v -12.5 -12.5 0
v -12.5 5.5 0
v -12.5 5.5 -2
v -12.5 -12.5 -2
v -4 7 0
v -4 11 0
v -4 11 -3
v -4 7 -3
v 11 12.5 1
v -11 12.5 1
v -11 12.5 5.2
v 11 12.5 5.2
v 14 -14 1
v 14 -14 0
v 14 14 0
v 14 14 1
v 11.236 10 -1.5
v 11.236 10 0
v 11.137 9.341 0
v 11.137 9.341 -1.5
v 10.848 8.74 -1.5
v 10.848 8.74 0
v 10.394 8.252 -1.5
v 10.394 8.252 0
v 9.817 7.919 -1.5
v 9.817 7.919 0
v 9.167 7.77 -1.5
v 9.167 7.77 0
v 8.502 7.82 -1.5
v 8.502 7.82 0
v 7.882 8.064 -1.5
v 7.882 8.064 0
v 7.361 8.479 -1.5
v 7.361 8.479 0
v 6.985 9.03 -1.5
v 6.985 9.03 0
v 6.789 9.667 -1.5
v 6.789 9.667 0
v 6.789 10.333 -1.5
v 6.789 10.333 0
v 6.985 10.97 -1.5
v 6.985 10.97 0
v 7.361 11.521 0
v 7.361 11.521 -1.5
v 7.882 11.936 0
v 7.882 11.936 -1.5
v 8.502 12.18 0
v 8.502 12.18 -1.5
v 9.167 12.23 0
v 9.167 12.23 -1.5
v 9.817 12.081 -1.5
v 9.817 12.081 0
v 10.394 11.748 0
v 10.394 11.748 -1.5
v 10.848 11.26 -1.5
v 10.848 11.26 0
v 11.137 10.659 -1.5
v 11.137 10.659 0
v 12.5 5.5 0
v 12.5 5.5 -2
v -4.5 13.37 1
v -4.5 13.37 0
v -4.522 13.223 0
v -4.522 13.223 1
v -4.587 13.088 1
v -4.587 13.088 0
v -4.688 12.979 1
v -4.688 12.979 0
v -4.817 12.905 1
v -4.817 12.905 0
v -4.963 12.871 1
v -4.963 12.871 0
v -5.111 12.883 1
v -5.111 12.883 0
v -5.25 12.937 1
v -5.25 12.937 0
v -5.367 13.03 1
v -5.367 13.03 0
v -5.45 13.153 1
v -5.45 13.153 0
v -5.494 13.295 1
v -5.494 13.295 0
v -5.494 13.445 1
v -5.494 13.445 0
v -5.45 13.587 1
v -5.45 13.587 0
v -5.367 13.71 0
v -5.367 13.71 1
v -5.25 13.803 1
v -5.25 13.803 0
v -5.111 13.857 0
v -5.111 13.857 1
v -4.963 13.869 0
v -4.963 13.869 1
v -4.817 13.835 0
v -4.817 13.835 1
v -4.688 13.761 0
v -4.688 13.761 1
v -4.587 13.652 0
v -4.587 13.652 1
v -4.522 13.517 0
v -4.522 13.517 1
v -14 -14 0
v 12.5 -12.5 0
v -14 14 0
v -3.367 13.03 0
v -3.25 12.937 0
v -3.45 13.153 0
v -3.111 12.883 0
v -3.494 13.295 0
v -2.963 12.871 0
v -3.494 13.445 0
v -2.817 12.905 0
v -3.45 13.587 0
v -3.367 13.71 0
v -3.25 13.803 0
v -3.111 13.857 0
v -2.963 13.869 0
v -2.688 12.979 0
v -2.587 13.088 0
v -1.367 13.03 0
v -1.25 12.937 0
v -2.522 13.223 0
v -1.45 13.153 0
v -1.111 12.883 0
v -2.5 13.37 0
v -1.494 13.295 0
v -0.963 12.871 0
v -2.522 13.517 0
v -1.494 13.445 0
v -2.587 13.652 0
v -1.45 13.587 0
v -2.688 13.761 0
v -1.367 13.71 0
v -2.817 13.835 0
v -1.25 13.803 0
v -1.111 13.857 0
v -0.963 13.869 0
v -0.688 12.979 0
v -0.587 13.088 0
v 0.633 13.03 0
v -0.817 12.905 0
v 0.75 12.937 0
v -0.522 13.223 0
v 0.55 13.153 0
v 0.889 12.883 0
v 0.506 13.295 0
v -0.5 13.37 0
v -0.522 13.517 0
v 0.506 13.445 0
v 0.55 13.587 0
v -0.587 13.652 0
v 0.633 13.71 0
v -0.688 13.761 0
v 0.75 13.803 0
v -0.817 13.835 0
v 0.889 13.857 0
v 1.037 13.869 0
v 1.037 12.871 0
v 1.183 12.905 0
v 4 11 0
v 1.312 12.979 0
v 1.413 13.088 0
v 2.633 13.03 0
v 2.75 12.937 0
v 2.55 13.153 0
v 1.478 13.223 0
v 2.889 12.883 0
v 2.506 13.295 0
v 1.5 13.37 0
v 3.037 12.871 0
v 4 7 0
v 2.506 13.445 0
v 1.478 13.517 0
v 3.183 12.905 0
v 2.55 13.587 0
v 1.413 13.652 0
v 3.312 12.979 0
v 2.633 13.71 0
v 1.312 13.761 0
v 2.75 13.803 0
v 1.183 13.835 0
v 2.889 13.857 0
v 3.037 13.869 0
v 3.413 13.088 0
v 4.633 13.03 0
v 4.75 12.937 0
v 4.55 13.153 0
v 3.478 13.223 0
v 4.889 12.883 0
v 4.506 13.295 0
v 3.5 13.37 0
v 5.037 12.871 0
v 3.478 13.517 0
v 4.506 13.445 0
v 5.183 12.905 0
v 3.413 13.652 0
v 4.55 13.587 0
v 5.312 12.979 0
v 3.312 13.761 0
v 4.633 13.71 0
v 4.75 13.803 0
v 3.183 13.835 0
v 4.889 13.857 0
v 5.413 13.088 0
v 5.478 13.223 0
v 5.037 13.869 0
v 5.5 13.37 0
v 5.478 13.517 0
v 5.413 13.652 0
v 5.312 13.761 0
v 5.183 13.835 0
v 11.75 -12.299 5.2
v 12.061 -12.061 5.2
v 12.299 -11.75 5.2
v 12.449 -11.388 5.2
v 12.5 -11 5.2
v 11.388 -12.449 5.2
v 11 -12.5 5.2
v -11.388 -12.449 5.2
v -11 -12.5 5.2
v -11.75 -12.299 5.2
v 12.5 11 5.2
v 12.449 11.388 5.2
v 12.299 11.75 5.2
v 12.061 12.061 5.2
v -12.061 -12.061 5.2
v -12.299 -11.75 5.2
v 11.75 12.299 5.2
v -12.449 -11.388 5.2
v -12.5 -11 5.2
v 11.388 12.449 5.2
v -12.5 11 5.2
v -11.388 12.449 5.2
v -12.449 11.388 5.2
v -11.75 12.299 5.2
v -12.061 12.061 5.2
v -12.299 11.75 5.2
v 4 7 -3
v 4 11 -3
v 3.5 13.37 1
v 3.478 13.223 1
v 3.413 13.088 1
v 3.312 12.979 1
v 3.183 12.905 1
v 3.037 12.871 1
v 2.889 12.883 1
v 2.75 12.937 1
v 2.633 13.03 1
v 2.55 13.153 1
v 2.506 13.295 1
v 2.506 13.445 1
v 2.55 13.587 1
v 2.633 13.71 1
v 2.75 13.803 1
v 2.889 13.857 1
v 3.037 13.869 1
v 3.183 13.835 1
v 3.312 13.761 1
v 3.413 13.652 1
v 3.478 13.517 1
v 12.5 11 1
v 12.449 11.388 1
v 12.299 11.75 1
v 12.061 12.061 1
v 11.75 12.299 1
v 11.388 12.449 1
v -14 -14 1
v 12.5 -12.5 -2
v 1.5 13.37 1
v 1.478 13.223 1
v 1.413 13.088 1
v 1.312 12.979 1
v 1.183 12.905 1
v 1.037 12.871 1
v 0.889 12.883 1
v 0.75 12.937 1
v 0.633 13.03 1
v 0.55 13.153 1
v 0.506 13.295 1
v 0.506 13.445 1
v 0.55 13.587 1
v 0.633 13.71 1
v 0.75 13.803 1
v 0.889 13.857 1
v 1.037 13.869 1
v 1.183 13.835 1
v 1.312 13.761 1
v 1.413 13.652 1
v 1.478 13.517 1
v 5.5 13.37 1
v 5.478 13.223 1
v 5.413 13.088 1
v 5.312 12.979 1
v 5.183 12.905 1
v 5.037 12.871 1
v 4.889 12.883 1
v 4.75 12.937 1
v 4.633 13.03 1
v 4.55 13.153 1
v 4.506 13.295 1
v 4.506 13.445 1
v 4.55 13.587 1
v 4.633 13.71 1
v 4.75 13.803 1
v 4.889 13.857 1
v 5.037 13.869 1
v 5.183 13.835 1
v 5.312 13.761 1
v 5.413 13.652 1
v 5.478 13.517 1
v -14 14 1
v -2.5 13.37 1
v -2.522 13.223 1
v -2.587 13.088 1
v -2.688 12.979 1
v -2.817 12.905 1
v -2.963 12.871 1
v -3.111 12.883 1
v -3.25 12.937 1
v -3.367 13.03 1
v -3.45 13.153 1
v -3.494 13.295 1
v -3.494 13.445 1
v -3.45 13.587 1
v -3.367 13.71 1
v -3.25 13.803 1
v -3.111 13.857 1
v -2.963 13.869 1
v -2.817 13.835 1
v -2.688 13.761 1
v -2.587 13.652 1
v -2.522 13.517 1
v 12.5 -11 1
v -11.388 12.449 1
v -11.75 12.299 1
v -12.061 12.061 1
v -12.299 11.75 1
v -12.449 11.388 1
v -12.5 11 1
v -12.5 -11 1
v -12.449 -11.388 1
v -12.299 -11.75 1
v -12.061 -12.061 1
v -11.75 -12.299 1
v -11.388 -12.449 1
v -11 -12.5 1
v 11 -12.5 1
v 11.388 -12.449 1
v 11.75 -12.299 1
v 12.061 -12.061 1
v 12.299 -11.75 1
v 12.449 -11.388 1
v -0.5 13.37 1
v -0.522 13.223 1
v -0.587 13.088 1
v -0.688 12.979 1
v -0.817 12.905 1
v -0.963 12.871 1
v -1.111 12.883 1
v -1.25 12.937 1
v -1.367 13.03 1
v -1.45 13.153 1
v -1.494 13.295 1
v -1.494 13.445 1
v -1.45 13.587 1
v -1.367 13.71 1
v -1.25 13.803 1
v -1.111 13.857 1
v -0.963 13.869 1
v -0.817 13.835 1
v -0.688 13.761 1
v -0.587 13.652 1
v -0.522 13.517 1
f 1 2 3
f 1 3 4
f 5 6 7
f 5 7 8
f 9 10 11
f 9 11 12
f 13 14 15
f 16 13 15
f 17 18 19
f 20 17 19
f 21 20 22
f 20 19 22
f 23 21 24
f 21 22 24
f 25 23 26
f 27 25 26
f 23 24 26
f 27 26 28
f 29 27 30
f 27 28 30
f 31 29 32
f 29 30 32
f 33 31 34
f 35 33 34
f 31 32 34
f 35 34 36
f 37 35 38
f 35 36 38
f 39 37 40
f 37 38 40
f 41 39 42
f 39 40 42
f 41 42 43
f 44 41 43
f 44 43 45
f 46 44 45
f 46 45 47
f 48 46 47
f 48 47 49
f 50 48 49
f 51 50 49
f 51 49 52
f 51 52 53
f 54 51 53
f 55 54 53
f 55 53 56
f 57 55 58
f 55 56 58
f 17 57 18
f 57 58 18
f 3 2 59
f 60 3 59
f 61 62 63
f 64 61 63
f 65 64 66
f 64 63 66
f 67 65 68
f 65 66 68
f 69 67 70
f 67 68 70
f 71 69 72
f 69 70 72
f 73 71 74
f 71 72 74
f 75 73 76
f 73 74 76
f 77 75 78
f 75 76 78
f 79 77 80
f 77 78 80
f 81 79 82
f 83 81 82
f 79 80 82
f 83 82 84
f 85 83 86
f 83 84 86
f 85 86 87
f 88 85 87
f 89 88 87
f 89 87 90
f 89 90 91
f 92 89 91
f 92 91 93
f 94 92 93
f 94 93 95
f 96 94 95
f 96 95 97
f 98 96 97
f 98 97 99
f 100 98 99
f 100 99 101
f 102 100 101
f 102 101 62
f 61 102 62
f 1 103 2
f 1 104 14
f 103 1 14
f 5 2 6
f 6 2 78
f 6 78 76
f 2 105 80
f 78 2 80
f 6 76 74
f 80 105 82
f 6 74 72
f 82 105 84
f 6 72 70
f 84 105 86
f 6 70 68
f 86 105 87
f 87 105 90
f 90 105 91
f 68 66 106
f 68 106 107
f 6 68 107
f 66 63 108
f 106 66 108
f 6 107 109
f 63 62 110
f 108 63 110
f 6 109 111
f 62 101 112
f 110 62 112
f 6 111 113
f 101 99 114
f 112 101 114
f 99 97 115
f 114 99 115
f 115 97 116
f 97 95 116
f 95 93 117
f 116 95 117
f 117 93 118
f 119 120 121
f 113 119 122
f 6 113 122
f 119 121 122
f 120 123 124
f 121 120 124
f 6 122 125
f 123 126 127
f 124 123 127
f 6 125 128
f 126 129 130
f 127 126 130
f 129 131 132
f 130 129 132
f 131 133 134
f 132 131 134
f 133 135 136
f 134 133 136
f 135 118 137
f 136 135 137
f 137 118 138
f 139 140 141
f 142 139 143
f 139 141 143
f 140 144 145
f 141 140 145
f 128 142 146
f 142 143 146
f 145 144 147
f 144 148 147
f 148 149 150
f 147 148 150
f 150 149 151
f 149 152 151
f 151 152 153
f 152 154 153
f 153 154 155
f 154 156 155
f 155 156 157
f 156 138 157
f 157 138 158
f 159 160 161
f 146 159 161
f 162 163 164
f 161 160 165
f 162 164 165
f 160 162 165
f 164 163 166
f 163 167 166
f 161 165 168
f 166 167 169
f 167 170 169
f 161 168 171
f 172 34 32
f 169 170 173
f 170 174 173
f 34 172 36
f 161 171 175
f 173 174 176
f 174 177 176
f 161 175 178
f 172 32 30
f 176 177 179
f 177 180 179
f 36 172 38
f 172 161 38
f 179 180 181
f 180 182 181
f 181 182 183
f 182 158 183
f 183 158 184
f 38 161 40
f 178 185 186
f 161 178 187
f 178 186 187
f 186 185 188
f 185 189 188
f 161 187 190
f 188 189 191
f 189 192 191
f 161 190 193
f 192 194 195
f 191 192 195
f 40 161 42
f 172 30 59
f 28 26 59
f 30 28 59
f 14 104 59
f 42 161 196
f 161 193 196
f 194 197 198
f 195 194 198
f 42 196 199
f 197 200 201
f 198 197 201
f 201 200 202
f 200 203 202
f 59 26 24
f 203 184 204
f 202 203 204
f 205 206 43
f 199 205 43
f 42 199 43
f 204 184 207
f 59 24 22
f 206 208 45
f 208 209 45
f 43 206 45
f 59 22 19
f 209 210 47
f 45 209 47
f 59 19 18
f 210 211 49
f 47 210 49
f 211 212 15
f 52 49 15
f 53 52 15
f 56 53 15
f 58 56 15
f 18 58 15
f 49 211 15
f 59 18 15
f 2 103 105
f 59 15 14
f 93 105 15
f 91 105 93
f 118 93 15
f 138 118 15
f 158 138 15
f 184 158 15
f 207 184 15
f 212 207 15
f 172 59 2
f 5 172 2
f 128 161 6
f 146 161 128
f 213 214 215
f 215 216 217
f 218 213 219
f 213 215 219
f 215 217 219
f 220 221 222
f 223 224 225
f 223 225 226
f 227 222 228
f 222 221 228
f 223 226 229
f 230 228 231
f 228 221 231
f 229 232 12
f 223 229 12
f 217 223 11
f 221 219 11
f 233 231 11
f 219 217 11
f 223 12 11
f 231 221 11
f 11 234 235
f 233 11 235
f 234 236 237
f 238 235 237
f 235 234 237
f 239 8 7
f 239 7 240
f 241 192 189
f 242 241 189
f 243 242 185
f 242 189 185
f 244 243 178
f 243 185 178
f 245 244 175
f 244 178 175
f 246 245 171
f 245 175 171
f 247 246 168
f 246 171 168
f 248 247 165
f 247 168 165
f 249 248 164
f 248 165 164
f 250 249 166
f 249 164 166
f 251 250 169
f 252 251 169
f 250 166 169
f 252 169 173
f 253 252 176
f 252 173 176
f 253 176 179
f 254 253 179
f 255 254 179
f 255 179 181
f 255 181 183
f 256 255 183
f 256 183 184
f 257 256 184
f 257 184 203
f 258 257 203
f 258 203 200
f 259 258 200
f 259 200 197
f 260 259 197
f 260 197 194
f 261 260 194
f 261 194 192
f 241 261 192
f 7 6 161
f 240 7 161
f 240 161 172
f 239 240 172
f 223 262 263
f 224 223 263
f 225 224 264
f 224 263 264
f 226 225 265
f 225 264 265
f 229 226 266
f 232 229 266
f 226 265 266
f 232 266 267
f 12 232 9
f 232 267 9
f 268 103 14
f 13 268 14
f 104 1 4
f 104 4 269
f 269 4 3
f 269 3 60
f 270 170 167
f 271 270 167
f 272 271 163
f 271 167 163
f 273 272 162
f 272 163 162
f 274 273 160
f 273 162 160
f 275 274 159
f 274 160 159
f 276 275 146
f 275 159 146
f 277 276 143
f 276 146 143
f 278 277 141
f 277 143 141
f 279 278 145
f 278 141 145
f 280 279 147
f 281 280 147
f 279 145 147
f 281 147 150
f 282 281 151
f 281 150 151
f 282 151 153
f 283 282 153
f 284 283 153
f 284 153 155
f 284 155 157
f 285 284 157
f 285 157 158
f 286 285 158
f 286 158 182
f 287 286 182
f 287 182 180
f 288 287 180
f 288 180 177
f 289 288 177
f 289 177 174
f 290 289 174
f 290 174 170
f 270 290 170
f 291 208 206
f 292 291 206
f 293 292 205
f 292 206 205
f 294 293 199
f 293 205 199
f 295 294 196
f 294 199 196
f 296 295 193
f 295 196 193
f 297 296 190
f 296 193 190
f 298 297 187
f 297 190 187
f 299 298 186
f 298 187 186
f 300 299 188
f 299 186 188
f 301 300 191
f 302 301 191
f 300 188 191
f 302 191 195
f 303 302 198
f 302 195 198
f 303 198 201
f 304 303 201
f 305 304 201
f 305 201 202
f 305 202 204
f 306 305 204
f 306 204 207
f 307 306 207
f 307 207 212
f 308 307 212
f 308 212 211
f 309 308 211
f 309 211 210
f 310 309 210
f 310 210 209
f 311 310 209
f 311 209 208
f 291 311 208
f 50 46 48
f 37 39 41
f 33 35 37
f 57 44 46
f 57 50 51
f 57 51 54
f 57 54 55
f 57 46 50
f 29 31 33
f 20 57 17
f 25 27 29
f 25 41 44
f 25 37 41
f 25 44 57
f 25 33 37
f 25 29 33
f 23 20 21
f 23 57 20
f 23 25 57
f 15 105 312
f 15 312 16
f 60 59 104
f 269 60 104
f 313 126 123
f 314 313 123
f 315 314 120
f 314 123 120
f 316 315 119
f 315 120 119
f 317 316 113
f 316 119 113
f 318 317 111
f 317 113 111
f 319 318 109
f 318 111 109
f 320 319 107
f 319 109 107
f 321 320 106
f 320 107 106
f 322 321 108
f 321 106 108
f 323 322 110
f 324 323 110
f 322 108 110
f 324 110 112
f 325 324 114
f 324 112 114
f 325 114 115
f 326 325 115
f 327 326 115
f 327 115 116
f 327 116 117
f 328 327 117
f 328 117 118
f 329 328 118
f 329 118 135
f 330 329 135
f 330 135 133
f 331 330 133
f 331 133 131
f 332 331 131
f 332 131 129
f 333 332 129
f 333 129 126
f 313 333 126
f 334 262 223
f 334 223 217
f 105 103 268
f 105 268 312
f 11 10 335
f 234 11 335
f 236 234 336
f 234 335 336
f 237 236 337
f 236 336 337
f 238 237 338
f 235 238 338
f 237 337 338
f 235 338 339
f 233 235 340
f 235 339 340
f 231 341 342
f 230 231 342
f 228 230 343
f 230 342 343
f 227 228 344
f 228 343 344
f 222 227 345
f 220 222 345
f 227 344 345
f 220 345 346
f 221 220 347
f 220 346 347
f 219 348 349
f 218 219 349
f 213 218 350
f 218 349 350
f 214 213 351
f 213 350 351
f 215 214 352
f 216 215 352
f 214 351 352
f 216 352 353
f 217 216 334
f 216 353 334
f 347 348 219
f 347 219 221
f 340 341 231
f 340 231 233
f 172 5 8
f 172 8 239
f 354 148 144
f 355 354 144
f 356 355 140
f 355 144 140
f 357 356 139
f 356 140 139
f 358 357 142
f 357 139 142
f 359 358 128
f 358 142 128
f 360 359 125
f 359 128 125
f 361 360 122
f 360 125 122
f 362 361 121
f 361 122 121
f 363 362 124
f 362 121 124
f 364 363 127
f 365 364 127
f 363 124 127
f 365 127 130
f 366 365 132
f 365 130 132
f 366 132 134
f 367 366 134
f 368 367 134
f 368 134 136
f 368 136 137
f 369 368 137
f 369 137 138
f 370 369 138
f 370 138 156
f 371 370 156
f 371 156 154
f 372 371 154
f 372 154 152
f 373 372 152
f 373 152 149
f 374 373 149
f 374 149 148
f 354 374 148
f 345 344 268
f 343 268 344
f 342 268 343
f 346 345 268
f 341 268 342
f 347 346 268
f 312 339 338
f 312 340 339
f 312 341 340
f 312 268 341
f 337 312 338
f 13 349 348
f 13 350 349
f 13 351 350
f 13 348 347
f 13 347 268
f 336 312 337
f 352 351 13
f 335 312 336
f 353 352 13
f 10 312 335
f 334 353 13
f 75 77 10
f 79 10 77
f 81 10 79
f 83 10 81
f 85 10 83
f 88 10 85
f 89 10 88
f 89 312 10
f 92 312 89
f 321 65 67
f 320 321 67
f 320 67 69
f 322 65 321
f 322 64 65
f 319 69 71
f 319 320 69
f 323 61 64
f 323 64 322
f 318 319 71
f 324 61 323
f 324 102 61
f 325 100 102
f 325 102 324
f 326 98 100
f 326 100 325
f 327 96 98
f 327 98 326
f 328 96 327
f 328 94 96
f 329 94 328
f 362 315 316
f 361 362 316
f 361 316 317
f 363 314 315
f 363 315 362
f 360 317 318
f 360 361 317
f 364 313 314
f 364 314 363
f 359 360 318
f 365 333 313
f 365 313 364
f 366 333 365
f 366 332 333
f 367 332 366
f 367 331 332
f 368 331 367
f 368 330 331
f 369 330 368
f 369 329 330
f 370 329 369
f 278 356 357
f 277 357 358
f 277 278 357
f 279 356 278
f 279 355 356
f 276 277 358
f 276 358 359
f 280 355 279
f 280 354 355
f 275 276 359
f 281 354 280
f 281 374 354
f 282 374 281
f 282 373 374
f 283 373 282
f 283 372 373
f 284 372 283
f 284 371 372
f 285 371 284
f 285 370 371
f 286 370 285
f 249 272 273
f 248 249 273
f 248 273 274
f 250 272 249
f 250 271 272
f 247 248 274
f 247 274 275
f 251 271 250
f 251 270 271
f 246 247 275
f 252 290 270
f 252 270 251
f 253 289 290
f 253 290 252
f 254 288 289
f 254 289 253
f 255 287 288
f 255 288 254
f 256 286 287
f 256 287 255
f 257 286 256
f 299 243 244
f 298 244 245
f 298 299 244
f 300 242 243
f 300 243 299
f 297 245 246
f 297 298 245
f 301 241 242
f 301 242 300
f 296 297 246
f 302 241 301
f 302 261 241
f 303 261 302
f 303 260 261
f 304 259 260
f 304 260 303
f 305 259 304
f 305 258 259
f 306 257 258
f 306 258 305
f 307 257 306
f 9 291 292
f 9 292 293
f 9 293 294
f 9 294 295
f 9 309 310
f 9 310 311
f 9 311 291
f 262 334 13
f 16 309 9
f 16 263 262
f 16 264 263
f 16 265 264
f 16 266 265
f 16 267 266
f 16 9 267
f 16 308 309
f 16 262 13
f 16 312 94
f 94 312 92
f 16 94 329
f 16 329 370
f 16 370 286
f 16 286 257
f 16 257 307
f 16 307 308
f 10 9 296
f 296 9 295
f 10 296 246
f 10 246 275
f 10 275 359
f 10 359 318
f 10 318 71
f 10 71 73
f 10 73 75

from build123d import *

# Parameters (mm, degrees)
SKETCH_W     = 28
SKETCH_H     = 28
PAD_DEPTH    = 1
PAD001_DEPTH = 4.2
SKETCH002_W  = 8
SKETCH002_H  = 4
PAD002_DEPTH = 3
SKETCH003_W  = 25
SKETCH003_H  = 18
PAD003_DEPTH = 2
SKETCH004_R  = 2.236068
PAD004_DEPTH = 1.5
SKETCH005_R  = 0.5
POCKET_DEPTH = 5.201


with BuildPart() as part:
    # Sketch → Pad (new body)
    with BuildSketch(Plane.XY):
        Rectangle(SKETCH_W, SKETCH_H)
    extrude(amount=PAD_DEPTH)

    # Sketch001 (on Face6 of Pad) → Pad001 (join)
    with BuildSketch(Plane.XY.offset(1)):
        with BuildLine():
            Line((-11, 12.5), (11, 12.5))
            ThreePointArc((12.5, 11), (12.06066, 12.06066), (11, 12.5))
            Line((12.5, 11), (12.5, -11))
            ThreePointArc((11, -12.5), (12.06066, -12.06066), (12.5, -11))
            Line((11, -12.5), (-11, -12.5))
            ThreePointArc((-12.5, -11), (-12.06066, -12.06066), (-11, -12.5))
            Line((-12.5, -11), (-12.5, 11))
            ThreePointArc((-11, 12.5), (-12.06066, 12.06066), (-12.5, 11))
        make_face()
    extrude(amount=PAD001_DEPTH)

    # Sketch002 (on Face4 of Pad001) → Pad002 (join)
    with BuildSketch(Plane(origin=(0, 0, 0), x_dir=(1, 0, 0), z_dir=(0, 0, -1))):
        with Locations((0, -9)):
            Rectangle(SKETCH002_W, SKETCH002_H)
    extrude(amount=PAD002_DEPTH)

    # Sketch003 (on Face4 of Pad002) → Pad003 (join)
    with BuildSketch(Plane(origin=(0, 0, 0), x_dir=(1, 0, 0), z_dir=(0, 0, -1))):
        with Locations((0, 3.5)):
            Rectangle(SKETCH003_W, SKETCH003_H)
    extrude(amount=PAD003_DEPTH)

    # Sketch004 (on Face4 of Pad003) → Pad004 (join)
    with BuildSketch(Plane(origin=(0, 0, 0), x_dir=(1, 0, 0), z_dir=(0, 0, -1))):
        with Locations((9, -10)):
            Circle(SKETCH004_R)
    extrude(amount=PAD004_DEPTH)

    # Sketch005 (on Face4 of Pad004) → Pocket (cut, through all)
    with BuildSketch(Plane(origin=(0, 0, 0), x_dir=(1, 0, 0), z_dir=(0, 0, -1))):
        with Locations((-5, -13.37)):
            Circle(SKETCH005_R)
        with Locations((-3, -13.37)):
            Circle(SKETCH005_R)
        with Locations((-1, -13.37)):
            Circle(SKETCH005_R)
        with Locations((1, -13.37)):
            Circle(SKETCH005_R)
        with Locations((3, -13.37)):
            Circle(SKETCH005_R)
        with Locations((5, -13.37)):
            Circle(SKETCH005_R)
    extrude(amount=-POCKET_DEPTH, mode=Mode.SUBTRACT)


solid = part.part
